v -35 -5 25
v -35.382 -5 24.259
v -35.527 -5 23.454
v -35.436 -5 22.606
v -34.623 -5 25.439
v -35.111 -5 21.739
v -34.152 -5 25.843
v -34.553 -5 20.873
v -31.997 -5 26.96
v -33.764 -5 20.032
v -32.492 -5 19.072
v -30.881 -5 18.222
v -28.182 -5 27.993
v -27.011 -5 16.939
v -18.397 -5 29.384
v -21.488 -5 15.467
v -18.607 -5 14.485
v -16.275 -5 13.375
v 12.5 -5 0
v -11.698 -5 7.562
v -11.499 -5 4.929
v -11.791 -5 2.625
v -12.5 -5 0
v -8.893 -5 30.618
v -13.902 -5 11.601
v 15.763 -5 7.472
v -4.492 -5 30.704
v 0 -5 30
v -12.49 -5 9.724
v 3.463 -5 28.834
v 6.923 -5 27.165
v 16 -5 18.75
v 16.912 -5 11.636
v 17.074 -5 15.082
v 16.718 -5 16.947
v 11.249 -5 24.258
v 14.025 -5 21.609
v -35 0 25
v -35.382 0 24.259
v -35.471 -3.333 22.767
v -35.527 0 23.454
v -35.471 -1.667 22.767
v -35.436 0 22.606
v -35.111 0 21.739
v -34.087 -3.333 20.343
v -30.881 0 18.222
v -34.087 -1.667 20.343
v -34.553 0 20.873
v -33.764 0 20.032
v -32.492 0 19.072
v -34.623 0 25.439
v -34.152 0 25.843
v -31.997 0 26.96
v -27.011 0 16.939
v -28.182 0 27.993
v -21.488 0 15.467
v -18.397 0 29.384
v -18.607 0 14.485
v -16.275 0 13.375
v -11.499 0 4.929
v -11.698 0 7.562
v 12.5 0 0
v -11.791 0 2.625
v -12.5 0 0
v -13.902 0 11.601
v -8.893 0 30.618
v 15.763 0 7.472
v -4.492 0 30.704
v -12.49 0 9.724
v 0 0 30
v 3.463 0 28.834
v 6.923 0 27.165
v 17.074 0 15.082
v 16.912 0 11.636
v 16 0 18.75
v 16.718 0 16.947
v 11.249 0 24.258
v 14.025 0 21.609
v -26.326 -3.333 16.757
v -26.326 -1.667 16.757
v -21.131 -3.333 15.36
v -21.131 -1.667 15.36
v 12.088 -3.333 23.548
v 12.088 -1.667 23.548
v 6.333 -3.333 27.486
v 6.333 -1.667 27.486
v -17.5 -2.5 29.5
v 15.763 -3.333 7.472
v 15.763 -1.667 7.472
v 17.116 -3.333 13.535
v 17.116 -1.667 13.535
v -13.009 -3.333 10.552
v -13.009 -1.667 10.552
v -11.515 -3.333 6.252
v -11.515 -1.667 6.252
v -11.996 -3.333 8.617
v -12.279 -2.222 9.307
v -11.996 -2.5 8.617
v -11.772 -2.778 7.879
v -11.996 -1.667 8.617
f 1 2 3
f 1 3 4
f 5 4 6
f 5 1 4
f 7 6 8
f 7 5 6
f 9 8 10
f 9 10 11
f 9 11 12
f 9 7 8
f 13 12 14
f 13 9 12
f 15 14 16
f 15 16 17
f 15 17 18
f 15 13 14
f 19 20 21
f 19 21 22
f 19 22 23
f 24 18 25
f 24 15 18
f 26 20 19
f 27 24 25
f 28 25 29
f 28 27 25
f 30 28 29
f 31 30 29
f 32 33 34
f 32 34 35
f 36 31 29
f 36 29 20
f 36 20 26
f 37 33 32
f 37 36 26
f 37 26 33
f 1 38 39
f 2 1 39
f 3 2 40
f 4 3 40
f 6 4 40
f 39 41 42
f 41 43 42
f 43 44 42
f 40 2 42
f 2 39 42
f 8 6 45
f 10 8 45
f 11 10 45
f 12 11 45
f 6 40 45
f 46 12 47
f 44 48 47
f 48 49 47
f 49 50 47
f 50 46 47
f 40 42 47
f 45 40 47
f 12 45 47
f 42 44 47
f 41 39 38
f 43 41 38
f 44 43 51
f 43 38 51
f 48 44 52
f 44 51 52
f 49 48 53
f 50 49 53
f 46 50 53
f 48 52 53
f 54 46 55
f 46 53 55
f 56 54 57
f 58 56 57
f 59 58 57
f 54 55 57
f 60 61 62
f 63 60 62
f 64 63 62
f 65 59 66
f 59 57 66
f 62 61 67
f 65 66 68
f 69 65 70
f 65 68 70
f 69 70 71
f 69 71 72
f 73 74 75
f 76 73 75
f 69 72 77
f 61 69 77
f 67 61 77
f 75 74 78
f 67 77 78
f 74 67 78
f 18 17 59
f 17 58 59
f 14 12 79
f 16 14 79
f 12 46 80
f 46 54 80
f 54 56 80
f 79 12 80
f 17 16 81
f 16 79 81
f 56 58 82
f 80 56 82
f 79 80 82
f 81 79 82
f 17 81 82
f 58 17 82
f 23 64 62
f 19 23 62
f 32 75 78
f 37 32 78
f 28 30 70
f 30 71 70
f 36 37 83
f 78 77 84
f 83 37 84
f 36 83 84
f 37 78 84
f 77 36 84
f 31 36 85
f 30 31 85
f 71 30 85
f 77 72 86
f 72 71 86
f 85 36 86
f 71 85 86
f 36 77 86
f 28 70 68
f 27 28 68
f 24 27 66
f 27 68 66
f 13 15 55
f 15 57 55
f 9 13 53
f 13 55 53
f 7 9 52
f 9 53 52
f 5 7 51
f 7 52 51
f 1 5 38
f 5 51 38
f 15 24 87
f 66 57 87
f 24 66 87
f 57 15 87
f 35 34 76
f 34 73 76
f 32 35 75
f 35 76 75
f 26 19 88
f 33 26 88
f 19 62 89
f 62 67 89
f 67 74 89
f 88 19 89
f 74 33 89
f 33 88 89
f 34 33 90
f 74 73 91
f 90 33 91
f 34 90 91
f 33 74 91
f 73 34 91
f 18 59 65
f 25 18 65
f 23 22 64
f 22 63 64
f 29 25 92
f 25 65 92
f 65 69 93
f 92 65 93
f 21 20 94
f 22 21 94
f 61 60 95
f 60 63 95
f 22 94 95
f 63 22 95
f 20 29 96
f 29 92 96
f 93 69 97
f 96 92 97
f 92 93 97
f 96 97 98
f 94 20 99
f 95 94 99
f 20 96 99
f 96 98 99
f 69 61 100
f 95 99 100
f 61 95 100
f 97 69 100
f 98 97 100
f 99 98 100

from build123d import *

# Parameters (mm, degrees)
F1_DEPTH = 5


with BuildPart() as f1:
    # F0 (on Front) → F1 (new body)
    with BuildSketch(Plane.XZ):
        with BuildLine():
            add(Edge.make_bspline(
                [(-16.2746694241, 13.3752361256), (-12.3598618618, 11.1329716306), (-10.0386444447, 7.3865768576), (-12.5, 0)],
                knots=[0.904225906, 0.904225906, 0.904225906, 0.904225906, 1, 1, 1, 1], degree=3))
            Line((-12.5, 0), (0, 0))
            Line((0, 0), (0, 12.5))
            Line((0, 12.5), (-8.75, 18.75))
            Line((-8.75, 18.75), (-16.2746694241, 13.3752361256))
        make_face()
        with BuildLine():
            add(Edge.make_bspline(
                [(0, 30), (-5.8674840792, 31.5264546669), (-15.8433075246, 29.2207215847), (-32.8722086235, 27.9759279501), (-35, 25)],
                knots=[0.3497970518, 0.3497970518, 0.3497970518, 0.3497970518, 0.5163060464, 0.6854672924, 0.6854672924, 0.6854672924, 0.6854672924], degree=3))
            Line((-35, 25), (-30.8810526687, 25))
            Line((-30.8810526687, 25), (-17.5, 25))
            Line((-17.5, 25), (0, 25))
            Line((0, 25), (0, 30))
        make_face()
        with BuildLine():
            Line((0, 18.75), (16, 18.75))
            add(Edge.make_bspline(
                [(16, 18.75), (13.4303616154, 23.7899314985), (6.2018305977, 28.3865634518), (0, 30)],
                knots=[0.1737998843, 0.1737998843, 0.1737998843, 0.1737998843, 0.3497970518, 0.3497970518, 0.3497970518, 0.3497970518], degree=3))
            Line((0, 30), (0, 25))
            Line((0, 25), (0, 18.75))
        make_face()
        with BuildLine():
            Line((0, 12.5), (0, 0))
            Line((0, 0), (12.5, 0))
            add(Edge.make_bspline(
                [(12.5, 0), (16.53182565, 8.3636820514), (18.537557056, 13.7729908565), (16, 18.75)],
                knots=[0, 0, 0, 0, 0.1737998843, 0.1737998843, 0.1737998843, 0.1737998843], degree=3))
            Line((16, 18.75), (0, 18.75))
            Line((0, 18.75), (0, 12.5))
        make_face()
        with BuildLine():
            add(Edge.make_bspline(
                [(-35, 25), (-36.4097549138, 23.0283174858), (-34.986463175, 20.0256776894), (-30.8810526687, 18.2215466751)],
                knots=[0.6854672924, 0.6854672924, 0.6854672924, 0.6854672924, 0.7975440215, 0.7975440215, 0.7975440215, 0.7975440215], degree=3))
            Line((-30.8810526687, 18.2215466751), (-35, 25))
        make_face()
        Polygon((-35, 25), (-30.8810526687, 18.2215466751), (-30.8810526687, 25), align=None)
        with BuildLine():
            add(Edge.make_bspline(
                [(-30.8810526687, 18.2215466751), (-26.9732572447, 16.5042580115), (-20.6353376436, 15.8728739705), (-16.2746694241, 13.3752361256)],
                knots=[0.7975440215, 0.7975440215, 0.7975440215, 0.7975440215, 0.904225906, 0.904225906, 0.904225906, 0.904225906], degree=3))
            Line((-16.2746694241, 13.3752361256), (-8.75, 18.75))
            Line((-8.75, 18.75), (-17.5, 25))
            Line((-17.5, 25), (-30.8810526687, 18.2215466751))
        make_face()
        Polygon((-30.8810526687, 25), (-30.8810526687, 18.2215466751), (-17.5, 25), align=None)
        Polygon((-17.5, 25), (-8.75, 18.75), (0, 25), align=None)
        Polygon((-8.75, 18.75), (0, 12.5), (0, 18.75), (0, 25), align=None)
    extrude(amount=F1_DEPTH)


solid = f1.part
